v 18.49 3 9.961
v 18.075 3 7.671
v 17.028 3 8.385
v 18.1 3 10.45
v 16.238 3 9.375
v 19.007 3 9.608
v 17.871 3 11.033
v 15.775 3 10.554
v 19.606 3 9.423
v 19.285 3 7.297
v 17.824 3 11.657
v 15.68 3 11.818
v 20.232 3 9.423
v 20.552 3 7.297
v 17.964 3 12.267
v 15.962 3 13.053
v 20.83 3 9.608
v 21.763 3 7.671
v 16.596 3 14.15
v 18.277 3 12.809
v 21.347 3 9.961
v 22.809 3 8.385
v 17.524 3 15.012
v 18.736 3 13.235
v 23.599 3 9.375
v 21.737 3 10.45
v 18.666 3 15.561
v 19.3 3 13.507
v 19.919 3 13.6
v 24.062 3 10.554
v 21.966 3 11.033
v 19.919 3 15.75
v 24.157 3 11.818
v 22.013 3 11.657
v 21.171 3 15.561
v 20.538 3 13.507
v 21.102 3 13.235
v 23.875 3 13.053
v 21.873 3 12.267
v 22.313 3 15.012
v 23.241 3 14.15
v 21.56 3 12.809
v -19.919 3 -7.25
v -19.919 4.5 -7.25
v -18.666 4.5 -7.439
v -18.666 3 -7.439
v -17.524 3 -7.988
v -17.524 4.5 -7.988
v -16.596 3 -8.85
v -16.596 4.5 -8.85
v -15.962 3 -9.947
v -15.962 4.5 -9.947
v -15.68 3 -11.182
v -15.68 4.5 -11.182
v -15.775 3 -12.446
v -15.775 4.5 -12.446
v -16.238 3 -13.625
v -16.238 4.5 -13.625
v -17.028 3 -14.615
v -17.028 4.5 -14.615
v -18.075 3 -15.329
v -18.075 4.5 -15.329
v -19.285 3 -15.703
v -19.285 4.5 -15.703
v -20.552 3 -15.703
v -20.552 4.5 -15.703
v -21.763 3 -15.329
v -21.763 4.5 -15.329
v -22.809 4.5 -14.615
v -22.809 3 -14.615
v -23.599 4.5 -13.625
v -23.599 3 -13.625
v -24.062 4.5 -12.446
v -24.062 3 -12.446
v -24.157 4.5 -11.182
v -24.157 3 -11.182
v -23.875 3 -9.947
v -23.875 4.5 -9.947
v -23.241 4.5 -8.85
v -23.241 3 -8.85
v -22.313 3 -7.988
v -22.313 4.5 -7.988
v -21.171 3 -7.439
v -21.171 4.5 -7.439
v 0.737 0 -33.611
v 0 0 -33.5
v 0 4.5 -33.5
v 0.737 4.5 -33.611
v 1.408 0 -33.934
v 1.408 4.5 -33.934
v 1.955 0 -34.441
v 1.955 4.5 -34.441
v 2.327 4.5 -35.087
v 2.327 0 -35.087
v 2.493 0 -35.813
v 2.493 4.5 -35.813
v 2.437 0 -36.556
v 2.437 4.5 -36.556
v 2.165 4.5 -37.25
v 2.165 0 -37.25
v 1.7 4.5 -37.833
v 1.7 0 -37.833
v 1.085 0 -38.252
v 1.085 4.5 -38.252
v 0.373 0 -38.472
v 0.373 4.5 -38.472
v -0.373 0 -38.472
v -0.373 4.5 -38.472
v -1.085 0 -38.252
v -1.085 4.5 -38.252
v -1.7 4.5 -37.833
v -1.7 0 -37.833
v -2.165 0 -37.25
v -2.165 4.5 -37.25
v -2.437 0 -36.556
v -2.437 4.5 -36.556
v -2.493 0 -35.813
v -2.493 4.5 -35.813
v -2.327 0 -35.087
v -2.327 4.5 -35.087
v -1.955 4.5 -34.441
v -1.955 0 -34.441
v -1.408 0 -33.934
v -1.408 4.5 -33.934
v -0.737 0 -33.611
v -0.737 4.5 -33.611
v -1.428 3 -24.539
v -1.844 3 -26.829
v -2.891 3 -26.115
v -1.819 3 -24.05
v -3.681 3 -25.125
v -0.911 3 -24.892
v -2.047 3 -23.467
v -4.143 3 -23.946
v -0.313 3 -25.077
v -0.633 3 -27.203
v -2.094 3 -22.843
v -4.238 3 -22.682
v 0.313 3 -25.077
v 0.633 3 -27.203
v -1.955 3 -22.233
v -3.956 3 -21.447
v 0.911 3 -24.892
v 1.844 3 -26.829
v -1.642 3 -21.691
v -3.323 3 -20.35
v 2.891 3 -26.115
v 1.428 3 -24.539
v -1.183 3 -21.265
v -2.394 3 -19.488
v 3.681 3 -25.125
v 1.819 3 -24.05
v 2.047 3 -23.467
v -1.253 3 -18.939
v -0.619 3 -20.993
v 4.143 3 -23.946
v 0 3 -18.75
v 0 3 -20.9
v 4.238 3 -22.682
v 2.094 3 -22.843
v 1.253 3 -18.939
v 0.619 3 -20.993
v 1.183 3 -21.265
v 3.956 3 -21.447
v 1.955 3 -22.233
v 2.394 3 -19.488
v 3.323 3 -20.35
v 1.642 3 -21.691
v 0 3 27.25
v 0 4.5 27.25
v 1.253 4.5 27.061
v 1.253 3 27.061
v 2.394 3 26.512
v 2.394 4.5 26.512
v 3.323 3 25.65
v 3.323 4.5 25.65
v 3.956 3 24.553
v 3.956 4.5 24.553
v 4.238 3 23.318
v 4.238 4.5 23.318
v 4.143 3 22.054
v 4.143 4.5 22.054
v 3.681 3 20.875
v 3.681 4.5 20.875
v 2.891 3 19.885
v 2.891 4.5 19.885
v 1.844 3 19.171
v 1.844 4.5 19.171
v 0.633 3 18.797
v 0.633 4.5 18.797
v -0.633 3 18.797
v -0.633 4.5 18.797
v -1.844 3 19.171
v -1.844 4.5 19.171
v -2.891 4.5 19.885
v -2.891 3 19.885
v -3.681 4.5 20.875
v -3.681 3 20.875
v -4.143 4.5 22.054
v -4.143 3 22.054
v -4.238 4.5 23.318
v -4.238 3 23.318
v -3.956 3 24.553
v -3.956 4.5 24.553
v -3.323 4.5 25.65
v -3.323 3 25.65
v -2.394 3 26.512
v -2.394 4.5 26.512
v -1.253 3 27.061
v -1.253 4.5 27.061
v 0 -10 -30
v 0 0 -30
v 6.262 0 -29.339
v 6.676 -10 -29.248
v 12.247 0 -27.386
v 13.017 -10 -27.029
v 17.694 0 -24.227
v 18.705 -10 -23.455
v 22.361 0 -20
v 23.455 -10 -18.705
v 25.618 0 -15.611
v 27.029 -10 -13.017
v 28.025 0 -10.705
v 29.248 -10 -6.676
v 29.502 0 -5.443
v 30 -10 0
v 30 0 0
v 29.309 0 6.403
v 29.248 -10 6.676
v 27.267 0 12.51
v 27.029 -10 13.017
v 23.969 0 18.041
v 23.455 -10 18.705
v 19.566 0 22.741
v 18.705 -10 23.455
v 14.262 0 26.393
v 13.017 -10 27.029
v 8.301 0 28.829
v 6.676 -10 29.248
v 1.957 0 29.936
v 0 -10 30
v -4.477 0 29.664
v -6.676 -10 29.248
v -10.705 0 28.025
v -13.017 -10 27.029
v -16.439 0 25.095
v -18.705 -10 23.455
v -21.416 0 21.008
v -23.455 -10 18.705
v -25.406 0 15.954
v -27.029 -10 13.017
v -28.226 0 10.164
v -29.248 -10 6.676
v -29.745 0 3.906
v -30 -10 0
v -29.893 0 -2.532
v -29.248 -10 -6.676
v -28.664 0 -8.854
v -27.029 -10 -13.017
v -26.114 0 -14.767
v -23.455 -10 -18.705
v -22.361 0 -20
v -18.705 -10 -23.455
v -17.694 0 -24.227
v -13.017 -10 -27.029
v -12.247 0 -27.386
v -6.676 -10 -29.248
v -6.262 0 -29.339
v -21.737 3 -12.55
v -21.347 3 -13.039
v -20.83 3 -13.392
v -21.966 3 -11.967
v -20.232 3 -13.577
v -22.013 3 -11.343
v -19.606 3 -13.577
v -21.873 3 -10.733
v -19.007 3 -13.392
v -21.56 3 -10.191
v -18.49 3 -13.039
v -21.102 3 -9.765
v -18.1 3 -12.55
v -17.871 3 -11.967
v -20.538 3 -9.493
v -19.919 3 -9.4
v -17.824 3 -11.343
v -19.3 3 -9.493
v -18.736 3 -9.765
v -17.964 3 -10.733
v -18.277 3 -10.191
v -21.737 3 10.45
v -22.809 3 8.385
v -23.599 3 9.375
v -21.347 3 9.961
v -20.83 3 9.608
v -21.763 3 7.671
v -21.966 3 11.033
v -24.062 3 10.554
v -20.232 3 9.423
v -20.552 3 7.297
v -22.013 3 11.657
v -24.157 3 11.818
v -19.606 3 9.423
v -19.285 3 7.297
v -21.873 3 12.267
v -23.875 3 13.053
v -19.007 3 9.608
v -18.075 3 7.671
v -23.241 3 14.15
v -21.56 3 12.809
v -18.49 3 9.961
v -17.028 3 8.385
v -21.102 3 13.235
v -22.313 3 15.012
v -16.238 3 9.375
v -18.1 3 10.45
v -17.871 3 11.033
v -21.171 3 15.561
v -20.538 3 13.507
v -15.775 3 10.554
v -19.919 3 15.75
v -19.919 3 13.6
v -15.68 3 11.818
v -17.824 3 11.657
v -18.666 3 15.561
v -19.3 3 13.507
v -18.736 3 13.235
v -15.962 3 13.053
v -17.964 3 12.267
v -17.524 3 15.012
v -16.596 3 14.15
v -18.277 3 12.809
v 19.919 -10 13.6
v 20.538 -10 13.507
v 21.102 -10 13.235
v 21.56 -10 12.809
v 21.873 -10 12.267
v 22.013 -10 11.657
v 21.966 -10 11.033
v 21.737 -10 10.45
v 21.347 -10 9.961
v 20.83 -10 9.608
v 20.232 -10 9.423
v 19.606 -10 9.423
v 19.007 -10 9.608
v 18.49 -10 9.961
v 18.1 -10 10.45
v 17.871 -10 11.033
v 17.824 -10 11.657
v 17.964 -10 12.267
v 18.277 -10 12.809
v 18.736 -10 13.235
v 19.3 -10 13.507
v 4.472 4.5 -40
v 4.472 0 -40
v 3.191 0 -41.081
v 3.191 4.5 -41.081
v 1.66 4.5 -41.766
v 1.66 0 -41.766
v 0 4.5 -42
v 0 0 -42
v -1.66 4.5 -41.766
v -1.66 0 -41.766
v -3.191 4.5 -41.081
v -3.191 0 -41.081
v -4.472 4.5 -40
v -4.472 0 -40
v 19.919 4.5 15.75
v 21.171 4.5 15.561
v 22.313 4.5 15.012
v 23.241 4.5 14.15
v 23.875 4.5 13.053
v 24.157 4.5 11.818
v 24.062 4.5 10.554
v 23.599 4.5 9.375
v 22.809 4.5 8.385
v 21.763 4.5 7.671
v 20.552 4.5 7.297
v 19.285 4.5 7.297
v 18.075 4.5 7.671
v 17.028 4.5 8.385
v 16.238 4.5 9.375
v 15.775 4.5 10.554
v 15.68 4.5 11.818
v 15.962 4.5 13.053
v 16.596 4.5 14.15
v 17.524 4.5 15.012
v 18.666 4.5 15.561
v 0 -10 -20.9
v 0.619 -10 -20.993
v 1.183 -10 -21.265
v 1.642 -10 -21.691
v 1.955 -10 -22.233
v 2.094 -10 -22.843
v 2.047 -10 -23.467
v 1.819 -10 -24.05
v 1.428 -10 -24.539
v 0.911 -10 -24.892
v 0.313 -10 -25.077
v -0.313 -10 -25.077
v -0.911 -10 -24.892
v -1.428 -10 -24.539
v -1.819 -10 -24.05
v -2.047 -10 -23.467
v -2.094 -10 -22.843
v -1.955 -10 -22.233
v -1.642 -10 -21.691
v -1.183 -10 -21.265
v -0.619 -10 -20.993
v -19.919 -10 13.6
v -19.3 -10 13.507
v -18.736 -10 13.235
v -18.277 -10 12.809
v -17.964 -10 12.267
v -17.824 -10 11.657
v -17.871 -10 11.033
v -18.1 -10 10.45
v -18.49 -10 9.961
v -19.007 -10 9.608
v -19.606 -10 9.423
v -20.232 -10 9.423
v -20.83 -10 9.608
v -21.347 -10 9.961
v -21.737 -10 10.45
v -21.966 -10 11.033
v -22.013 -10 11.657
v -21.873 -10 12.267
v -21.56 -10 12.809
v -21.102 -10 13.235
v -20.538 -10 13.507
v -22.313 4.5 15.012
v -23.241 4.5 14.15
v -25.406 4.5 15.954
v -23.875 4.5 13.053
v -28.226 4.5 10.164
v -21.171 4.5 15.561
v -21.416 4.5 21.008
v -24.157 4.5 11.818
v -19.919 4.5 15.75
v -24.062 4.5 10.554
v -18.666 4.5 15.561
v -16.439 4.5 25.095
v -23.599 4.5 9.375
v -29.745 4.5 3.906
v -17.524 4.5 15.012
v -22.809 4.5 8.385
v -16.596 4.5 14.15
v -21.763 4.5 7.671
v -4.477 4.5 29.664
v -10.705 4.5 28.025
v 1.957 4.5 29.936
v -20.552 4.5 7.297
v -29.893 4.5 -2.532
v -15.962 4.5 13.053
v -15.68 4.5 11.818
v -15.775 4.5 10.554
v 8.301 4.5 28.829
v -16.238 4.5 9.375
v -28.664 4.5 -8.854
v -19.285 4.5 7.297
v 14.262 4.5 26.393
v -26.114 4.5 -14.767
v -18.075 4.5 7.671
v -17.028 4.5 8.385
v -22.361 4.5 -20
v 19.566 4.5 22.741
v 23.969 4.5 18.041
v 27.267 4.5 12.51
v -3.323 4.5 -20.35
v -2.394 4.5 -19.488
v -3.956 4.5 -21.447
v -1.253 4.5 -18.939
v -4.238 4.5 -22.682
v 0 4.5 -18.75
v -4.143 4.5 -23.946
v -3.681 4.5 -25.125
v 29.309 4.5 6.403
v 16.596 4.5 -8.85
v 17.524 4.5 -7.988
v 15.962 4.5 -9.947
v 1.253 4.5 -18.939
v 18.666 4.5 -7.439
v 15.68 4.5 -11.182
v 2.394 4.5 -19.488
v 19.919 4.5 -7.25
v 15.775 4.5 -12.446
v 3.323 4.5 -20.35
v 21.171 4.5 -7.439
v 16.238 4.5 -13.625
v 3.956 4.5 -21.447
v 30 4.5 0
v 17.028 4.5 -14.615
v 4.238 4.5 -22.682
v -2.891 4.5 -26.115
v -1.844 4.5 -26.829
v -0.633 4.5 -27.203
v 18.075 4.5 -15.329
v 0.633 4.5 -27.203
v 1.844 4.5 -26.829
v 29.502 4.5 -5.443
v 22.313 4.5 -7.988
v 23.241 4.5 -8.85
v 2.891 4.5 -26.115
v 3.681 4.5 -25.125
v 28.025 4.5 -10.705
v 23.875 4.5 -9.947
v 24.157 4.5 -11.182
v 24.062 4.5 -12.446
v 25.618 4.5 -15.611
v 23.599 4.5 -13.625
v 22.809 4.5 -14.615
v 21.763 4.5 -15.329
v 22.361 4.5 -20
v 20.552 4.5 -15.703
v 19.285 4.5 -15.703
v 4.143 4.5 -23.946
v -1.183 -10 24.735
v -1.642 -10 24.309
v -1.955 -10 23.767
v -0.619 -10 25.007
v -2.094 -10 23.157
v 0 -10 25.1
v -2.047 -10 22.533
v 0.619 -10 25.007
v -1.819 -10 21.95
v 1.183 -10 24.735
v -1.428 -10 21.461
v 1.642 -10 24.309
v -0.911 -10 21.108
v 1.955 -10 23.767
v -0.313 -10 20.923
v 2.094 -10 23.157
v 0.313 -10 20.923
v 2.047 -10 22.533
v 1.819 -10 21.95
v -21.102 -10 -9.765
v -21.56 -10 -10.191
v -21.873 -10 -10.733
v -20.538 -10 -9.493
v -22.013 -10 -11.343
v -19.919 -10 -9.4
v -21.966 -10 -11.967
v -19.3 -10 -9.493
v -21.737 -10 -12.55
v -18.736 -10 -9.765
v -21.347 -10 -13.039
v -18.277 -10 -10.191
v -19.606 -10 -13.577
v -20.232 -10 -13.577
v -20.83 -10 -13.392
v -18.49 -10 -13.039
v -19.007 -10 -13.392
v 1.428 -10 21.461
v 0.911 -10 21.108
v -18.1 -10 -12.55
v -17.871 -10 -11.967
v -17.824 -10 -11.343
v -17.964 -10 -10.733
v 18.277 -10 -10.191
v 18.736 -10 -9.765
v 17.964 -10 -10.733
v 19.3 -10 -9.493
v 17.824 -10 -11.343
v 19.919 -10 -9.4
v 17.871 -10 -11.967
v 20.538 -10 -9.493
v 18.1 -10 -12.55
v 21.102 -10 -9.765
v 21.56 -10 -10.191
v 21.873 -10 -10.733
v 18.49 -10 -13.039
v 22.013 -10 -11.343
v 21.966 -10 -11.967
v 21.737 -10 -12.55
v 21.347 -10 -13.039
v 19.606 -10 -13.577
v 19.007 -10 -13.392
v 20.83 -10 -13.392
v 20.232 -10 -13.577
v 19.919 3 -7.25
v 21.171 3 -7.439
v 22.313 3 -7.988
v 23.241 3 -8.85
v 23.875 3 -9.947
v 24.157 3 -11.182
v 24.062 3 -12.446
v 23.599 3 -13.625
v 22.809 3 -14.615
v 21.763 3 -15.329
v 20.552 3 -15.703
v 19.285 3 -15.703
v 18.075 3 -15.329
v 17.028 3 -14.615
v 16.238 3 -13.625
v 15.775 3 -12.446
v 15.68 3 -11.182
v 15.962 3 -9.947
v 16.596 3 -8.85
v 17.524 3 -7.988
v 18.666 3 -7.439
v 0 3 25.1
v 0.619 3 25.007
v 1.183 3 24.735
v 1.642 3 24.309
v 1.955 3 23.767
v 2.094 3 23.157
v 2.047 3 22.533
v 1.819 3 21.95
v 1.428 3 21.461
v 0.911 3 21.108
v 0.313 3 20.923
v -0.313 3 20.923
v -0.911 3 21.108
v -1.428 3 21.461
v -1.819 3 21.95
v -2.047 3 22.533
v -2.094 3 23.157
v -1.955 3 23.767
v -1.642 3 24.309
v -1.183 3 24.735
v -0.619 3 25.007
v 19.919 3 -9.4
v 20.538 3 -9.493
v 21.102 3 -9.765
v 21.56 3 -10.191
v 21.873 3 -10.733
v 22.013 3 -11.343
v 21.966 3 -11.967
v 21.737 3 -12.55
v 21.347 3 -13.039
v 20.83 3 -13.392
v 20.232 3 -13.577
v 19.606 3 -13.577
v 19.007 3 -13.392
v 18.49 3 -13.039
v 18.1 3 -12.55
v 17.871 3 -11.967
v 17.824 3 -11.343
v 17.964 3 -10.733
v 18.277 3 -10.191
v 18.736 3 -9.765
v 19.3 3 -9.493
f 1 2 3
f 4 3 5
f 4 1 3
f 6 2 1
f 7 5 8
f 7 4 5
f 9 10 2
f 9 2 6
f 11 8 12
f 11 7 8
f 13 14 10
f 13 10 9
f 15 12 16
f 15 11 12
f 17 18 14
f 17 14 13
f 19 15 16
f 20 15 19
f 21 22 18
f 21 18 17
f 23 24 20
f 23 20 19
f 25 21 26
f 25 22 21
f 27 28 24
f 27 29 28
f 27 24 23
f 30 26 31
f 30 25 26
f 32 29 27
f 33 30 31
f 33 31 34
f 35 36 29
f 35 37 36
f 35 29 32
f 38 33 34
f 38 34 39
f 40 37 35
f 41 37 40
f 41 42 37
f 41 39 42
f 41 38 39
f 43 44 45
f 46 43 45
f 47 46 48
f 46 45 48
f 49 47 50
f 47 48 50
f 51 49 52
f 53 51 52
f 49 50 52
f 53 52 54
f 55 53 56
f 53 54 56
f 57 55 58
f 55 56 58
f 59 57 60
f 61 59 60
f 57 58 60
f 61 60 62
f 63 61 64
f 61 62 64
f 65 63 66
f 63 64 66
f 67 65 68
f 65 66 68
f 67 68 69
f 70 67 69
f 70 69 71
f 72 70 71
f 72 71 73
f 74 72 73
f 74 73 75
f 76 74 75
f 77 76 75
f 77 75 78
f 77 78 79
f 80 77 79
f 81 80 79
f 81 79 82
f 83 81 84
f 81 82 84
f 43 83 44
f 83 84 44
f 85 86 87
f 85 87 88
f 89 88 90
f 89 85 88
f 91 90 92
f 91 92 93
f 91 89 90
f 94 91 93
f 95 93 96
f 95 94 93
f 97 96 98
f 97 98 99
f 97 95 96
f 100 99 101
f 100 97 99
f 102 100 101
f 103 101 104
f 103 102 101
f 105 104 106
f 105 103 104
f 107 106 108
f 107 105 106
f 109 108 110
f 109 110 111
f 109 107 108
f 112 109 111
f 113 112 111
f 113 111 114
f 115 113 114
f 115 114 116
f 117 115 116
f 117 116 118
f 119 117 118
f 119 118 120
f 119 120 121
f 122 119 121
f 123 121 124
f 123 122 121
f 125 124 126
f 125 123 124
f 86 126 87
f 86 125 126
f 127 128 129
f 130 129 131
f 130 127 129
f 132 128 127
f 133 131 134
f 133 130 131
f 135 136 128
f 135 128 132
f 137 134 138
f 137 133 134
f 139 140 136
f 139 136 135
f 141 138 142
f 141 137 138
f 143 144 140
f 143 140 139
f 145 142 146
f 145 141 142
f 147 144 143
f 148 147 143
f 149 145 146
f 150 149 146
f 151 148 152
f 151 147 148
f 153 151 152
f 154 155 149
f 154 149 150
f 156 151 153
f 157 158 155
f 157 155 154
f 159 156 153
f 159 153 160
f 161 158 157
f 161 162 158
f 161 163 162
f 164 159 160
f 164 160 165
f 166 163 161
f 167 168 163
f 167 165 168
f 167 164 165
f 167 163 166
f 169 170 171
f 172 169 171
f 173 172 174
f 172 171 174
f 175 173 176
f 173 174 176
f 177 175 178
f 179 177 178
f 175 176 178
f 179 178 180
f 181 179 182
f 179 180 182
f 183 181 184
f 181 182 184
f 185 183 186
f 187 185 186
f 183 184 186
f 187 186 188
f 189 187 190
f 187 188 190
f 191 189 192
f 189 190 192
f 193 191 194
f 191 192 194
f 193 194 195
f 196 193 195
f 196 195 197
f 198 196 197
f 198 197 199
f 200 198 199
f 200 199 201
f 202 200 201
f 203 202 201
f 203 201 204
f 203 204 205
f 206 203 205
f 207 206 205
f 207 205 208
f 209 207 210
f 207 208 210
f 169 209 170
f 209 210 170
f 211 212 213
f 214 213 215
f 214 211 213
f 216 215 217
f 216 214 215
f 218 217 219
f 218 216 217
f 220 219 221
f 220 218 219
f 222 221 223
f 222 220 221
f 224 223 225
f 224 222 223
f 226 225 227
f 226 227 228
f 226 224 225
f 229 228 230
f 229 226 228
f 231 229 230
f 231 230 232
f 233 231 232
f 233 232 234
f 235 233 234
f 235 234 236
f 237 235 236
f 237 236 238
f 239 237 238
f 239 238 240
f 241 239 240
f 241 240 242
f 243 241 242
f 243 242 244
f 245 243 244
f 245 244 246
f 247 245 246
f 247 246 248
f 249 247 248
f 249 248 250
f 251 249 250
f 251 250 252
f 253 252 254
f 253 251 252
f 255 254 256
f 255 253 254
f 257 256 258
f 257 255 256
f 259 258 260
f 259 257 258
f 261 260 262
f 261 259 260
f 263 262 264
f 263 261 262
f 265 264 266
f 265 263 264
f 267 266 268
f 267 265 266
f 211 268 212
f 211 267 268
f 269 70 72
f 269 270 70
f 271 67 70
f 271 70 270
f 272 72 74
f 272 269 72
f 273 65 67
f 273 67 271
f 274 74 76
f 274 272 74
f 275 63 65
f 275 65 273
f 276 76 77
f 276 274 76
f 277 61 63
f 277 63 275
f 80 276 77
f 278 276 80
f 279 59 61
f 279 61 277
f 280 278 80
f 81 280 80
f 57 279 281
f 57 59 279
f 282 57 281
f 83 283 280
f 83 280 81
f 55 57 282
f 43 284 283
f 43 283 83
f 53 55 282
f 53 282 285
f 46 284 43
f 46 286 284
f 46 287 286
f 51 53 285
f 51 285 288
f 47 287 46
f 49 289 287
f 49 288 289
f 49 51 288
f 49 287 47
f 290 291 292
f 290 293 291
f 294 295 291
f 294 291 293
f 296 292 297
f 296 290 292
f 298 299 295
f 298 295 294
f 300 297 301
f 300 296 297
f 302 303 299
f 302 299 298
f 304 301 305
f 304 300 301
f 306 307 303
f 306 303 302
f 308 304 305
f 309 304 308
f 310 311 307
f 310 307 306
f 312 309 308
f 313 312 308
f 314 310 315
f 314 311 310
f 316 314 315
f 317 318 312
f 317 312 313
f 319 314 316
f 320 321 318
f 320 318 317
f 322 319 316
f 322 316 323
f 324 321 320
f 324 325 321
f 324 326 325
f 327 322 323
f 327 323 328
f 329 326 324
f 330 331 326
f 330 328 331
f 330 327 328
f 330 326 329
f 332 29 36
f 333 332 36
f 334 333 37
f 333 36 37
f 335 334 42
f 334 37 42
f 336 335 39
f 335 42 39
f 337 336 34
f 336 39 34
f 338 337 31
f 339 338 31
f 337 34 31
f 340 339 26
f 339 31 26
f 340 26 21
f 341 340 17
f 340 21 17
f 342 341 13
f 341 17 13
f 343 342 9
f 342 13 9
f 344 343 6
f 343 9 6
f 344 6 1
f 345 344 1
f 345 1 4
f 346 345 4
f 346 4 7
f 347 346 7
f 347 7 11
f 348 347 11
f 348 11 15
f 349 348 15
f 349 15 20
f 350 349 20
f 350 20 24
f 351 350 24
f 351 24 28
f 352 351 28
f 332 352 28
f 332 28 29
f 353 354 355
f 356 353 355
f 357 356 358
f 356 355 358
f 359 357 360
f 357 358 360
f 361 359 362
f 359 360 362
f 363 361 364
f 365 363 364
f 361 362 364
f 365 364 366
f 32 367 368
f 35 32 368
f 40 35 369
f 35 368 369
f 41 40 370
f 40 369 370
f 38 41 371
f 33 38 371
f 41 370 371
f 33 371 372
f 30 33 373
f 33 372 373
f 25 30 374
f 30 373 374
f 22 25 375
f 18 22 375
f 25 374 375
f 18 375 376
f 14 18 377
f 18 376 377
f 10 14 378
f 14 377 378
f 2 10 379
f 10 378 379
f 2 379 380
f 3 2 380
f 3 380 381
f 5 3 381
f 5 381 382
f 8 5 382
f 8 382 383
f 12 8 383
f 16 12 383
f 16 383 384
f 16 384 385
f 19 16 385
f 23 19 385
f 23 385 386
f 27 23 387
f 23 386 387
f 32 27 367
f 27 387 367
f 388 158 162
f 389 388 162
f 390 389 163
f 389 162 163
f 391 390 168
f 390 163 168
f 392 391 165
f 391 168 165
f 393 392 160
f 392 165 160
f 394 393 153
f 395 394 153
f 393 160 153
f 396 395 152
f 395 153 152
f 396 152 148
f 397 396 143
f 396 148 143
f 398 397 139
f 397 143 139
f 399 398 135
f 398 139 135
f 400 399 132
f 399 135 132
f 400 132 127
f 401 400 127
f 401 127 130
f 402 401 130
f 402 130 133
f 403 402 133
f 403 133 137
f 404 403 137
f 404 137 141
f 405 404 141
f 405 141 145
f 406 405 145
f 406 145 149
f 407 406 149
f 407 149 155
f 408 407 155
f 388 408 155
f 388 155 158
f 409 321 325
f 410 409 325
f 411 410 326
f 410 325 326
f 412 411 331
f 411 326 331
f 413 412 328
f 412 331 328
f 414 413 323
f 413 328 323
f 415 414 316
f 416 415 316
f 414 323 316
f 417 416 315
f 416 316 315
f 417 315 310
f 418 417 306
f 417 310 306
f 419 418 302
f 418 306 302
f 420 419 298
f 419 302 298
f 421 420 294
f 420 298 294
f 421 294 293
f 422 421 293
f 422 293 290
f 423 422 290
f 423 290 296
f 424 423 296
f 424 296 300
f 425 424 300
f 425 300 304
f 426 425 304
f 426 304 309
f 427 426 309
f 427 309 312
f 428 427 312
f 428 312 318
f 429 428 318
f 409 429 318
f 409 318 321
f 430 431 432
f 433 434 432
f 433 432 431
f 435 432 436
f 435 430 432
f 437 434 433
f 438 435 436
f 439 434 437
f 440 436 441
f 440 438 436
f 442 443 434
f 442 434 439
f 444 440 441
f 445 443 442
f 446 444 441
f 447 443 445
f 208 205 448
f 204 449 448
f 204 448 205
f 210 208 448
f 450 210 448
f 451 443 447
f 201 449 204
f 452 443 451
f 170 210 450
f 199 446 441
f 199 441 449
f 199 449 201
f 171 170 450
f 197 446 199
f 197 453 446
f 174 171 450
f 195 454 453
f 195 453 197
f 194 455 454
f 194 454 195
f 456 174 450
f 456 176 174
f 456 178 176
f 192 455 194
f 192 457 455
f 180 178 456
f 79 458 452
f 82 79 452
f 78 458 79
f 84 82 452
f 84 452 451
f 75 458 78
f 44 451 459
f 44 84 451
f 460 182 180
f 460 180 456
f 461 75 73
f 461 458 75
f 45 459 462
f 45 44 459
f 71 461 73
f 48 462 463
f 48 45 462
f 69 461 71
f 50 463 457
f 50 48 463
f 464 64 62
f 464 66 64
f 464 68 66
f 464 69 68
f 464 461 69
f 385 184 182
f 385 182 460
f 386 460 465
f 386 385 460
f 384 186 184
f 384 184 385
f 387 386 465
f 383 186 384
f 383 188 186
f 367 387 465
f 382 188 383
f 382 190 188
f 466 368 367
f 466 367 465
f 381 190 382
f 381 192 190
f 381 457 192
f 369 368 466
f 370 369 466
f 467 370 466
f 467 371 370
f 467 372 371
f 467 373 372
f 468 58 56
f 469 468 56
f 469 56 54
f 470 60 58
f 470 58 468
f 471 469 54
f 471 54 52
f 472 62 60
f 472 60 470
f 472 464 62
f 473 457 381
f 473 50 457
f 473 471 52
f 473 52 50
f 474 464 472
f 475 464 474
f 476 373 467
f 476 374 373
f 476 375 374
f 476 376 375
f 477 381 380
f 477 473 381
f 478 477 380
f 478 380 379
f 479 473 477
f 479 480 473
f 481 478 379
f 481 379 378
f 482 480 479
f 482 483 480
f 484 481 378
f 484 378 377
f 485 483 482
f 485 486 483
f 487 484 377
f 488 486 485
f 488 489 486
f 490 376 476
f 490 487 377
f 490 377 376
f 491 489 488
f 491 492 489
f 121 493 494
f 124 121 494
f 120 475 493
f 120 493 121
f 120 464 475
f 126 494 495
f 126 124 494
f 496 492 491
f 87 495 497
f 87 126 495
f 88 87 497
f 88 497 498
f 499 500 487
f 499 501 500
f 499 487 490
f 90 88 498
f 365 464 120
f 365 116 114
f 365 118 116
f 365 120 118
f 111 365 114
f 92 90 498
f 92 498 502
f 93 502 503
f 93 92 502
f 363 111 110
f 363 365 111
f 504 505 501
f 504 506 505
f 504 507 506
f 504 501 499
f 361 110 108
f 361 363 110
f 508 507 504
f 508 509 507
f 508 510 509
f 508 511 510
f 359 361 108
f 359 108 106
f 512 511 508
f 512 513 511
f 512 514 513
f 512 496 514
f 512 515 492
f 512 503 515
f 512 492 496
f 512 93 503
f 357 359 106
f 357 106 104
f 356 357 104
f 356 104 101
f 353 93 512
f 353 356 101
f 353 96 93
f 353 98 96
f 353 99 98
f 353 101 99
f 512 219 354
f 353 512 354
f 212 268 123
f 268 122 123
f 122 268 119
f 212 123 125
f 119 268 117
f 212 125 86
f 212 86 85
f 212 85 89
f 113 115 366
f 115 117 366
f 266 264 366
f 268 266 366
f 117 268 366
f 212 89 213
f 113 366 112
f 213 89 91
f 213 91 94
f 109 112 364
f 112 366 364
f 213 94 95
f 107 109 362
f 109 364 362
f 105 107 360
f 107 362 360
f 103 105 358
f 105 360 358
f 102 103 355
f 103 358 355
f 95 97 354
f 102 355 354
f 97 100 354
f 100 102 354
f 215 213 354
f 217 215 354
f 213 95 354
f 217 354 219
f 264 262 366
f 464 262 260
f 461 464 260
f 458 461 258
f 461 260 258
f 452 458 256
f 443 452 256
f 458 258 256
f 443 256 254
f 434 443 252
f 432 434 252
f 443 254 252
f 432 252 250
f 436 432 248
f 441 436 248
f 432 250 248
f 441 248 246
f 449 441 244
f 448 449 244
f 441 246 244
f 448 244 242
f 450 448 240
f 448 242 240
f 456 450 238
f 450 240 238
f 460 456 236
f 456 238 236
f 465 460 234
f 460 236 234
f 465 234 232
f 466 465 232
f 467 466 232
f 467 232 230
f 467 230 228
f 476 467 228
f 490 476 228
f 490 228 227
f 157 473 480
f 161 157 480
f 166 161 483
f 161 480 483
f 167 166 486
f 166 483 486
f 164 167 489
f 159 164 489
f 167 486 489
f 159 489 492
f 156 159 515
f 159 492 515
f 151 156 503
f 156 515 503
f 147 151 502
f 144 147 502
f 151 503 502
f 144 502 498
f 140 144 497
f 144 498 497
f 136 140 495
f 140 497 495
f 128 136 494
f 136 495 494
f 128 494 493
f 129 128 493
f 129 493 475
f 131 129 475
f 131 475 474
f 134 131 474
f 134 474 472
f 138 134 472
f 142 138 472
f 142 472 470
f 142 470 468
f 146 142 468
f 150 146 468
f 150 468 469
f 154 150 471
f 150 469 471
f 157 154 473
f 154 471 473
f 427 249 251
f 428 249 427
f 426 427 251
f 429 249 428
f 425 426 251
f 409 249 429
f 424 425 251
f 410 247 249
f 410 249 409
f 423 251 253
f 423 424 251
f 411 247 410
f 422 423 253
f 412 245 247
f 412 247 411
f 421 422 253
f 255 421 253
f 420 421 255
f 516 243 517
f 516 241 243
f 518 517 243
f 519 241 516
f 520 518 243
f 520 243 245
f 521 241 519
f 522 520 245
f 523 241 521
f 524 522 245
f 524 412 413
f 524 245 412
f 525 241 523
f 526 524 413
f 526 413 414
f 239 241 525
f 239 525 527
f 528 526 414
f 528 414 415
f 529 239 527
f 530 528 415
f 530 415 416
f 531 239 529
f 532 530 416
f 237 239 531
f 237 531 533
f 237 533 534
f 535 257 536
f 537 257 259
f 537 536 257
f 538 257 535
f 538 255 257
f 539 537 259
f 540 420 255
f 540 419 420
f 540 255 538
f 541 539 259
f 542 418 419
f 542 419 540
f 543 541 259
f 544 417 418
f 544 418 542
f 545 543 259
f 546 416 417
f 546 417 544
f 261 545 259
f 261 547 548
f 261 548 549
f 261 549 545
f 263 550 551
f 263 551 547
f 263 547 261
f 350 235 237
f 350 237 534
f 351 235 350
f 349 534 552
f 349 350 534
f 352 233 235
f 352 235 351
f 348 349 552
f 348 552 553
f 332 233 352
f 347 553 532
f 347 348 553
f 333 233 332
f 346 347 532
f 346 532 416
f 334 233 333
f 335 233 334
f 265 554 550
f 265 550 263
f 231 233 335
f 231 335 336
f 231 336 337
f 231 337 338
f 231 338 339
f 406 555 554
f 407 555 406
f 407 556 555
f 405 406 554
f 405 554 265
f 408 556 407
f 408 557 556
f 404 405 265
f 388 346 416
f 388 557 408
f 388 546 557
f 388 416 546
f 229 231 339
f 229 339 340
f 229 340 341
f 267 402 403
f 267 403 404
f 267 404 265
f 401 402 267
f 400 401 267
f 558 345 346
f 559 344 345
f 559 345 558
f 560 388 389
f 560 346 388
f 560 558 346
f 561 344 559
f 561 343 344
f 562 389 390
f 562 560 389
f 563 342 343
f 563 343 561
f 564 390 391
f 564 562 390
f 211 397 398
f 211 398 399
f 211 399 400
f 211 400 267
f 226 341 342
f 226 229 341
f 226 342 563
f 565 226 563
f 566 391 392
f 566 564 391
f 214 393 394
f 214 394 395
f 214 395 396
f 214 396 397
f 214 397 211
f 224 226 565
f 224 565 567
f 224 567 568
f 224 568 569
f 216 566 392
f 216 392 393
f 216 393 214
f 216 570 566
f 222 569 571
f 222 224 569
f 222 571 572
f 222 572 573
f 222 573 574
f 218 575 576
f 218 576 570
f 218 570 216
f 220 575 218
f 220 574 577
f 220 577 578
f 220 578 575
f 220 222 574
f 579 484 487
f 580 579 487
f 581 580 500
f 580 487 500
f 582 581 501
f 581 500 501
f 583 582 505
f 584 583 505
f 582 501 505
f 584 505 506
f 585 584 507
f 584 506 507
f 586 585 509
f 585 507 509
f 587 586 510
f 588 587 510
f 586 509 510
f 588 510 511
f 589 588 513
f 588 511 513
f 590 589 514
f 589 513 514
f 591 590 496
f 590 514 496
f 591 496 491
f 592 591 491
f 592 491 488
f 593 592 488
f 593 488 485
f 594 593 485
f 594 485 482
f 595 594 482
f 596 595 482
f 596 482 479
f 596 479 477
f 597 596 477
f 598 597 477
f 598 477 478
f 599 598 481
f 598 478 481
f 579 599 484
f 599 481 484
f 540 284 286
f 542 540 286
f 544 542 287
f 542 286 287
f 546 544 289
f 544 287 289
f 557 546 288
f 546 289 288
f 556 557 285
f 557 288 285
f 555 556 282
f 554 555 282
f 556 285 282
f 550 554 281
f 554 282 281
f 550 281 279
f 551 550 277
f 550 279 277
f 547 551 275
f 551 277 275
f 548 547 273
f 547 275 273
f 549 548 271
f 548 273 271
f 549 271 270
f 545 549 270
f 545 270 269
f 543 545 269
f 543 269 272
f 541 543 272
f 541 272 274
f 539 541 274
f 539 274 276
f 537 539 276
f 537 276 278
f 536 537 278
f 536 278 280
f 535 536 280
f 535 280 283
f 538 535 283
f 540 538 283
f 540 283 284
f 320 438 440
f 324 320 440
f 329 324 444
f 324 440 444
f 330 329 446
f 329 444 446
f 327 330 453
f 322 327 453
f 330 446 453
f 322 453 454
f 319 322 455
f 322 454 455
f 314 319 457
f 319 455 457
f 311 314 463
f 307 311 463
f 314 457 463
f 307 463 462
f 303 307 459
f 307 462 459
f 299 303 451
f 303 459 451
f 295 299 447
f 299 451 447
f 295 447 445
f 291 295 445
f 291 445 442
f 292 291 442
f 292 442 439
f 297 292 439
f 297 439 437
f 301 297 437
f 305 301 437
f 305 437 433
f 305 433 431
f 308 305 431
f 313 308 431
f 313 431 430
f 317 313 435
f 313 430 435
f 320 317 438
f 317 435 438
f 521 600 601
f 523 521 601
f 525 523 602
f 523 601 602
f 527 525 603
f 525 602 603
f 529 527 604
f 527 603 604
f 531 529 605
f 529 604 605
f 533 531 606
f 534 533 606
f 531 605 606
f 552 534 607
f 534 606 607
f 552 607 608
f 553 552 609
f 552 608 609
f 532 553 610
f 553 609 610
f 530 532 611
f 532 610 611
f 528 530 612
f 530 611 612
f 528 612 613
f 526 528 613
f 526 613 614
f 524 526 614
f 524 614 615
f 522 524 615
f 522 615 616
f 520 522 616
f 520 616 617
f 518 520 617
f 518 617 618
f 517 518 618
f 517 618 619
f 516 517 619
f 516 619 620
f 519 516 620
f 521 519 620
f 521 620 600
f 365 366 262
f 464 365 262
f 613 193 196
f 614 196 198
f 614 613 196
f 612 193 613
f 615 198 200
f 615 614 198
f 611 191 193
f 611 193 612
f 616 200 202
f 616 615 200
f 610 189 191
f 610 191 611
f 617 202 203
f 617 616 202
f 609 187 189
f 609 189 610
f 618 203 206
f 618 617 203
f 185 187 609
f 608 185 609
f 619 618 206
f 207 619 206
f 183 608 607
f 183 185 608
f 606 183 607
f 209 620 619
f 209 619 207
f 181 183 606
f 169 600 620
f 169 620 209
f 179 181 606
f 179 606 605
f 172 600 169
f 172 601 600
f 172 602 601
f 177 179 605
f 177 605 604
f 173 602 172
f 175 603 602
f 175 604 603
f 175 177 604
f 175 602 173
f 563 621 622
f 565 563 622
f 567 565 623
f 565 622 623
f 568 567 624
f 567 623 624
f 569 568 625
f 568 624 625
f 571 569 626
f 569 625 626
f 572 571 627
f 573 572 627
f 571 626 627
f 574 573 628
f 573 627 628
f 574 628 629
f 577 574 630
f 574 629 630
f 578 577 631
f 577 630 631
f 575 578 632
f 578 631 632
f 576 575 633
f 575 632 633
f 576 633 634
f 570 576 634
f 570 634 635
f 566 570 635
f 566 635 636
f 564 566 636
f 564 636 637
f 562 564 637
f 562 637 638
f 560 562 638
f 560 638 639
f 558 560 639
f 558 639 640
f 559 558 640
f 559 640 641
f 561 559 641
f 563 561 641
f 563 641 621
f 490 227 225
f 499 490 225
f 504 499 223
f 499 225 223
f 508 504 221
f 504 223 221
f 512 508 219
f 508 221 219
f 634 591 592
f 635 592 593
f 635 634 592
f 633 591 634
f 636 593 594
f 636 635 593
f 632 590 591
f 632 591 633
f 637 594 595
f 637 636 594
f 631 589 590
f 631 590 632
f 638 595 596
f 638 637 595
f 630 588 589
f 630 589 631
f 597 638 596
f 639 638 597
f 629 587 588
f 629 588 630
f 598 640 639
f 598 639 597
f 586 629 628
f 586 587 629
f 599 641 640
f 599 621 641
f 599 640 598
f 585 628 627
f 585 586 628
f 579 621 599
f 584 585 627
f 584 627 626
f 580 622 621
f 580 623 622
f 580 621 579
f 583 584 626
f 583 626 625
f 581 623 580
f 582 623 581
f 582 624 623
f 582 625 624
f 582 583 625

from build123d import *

# Parameters (mm, degrees)
SKETCH1_R           = 6
SKETCH1_R_2         = 2.5
BOSS_EXTRUDE1_DEPTH = 4.5
SKETCH2_R           = 4.25
CUT_EXTRUDE1_DEPTH  = 1.5
BOSS_EXTRUDE2_START = 10
SKETCH3_R           = 30
BOSS_EXTRUDE2_DEPTH = 10
SKETCH4_R           = 2.1
CUT_EXTRUDE2_DEPTH  = 43


with BuildPart() as part:
    # Sketch1 → Boss-Extrude1 (new body)
    # profile 1 of 4: a face of its own
    with BuildSketch(Plane(origin=(0, 0, 0), x_dir=(1, 0, 0), z_dir=(0, 1, 0))):
        with BuildLine():
            ThreePointArc((0, 30), (-12.247448714, 27.386127875), (-22.360679775, 20))
            ThreePointArc((-22.360679775, 20), (-10.704662693, -28.025170769), (30, 0))
            ThreePointArc((30, 0), (28.025170769, 10.704662693), (22.360679775, 20))
            ThreePointArc((22.360679775, 20), (12.247448714, 27.386127875), (0, 30))
        make_face()
    # profile 2 of 4: a face of its own
    with BuildSketch(Plane(origin=(0, 0, 0), x_dir=(1, 0, 0), z_dir=(0, 1, 0))):
        with BuildLine():
            Line((22.360679775, 20), (4.472135955, 40))
            ThreePointArc((4.472135955, 40), (5.605034154, 38.140932539), (6, 36))
            ThreePointArc((6, 36), (4.242640687, 31.757359313), (0, 30))
            ThreePointArc((0, 30), (12.247448714, 27.386127875), (22.360679775, 20))
        make_face()
    # profile 3 of 4: a face of its own
    with BuildSketch(Plane(origin=(0, 0, 0), x_dir=(1, 0, 0), z_dir=(0, 1, 0))):
        with BuildLine():
            ThreePointArc((0, 30), (-5.477225575, 33.550510257), (-4.472135955, 40))
            Line((-4.472135955, 40), (-22.360679775, 20))
            ThreePointArc((-22.360679775, 20), (-12.247448714, 27.386127875), (0, 30))
        make_face()
    # profile 4 of 4: a face of its own
    with BuildSketch(Plane(origin=(0, 0, 0), x_dir=(1, 0, 0), z_dir=(0, 1, 0))):
        with Locations((0, 36)):
            Circle(SKETCH1_R)
        with Locations(Location((0, 36, 0), (0, 0, 270))):
            Circle(SKETCH1_R_2, mode=Mode.SUBTRACT)
    extrude(amount=BOSS_EXTRUDE1_DEPTH)

    # Sketch2 → Cut-Extrude1 (cut)
    with BuildSketch(Plane(origin=(0, 4.5, 0), x_dir=(1, 0, 0), z_dir=(0, 1, 0))):
        with Locations(Location((0, 23, 0), (0, 0, 270))):
            Circle(SKETCH2_R)
        with Locations(Location((19.918584287, 11.5, 0), (0, 0, 270))):
            Circle(SKETCH2_R)
        with Locations(Location((19.918584287, -11.5, 0), (0, 0, 270))):
            Circle(SKETCH2_R)
        with Locations(Location((0, -23, 0), (0, 0, 270))):
            Circle(SKETCH2_R)
        with Locations(Location((-19.918584287, -11.5, 0), (0, 0, 270))):
            Circle(SKETCH2_R)
        with Locations(Location((-19.918584287, 11.5, 0), (0, 0, 270))):
            Circle(SKETCH2_R)
    extrude(amount=-CUT_EXTRUDE1_DEPTH, mode=Mode.SUBTRACT)

    # Sketch3 → Boss-Extrude2 (add)
    with BuildSketch(Plane.XZ.offset(BOSS_EXTRUDE2_START)):
        with Locations(Location((0, 0, 0), (0, 0, 270))):
            Circle(SKETCH3_R)
    extrude(amount=-BOSS_EXTRUDE2_DEPTH)

    # Sketch4 → Cut-Extrude2 (cut)
    with BuildSketch(Plane(origin=(0, 4.5, 0), x_dir=(1, 0, 0), z_dir=(0, 1, 0))):
        with Locations(Location((0, 23, 0), (0, 0, 270))):
            Circle(SKETCH4_R)
        with Locations(Location((19.918584287, 11.5, 0), (0, 0, 270))):
            Circle(SKETCH4_R)
        with Locations(Location((19.918584287, -11.5, 0), (0, 0, 270))):
            Circle(SKETCH4_R)
        with Locations(Location((0, -23, 0), (0, 0, 270))):
            Circle(SKETCH4_R)
        with Locations(Location((-19.918584287, -11.5, 0), (0, 0, 270))):
            Circle(SKETCH4_R)
        with Locations(Location((-19.918584287, 11.5, 0), (0, 0, 270))):
            Circle(SKETCH4_R)
    extrude(amount=-CUT_EXTRUDE2_DEPTH, mode=Mode.SUBTRACT)


solid = part.part
